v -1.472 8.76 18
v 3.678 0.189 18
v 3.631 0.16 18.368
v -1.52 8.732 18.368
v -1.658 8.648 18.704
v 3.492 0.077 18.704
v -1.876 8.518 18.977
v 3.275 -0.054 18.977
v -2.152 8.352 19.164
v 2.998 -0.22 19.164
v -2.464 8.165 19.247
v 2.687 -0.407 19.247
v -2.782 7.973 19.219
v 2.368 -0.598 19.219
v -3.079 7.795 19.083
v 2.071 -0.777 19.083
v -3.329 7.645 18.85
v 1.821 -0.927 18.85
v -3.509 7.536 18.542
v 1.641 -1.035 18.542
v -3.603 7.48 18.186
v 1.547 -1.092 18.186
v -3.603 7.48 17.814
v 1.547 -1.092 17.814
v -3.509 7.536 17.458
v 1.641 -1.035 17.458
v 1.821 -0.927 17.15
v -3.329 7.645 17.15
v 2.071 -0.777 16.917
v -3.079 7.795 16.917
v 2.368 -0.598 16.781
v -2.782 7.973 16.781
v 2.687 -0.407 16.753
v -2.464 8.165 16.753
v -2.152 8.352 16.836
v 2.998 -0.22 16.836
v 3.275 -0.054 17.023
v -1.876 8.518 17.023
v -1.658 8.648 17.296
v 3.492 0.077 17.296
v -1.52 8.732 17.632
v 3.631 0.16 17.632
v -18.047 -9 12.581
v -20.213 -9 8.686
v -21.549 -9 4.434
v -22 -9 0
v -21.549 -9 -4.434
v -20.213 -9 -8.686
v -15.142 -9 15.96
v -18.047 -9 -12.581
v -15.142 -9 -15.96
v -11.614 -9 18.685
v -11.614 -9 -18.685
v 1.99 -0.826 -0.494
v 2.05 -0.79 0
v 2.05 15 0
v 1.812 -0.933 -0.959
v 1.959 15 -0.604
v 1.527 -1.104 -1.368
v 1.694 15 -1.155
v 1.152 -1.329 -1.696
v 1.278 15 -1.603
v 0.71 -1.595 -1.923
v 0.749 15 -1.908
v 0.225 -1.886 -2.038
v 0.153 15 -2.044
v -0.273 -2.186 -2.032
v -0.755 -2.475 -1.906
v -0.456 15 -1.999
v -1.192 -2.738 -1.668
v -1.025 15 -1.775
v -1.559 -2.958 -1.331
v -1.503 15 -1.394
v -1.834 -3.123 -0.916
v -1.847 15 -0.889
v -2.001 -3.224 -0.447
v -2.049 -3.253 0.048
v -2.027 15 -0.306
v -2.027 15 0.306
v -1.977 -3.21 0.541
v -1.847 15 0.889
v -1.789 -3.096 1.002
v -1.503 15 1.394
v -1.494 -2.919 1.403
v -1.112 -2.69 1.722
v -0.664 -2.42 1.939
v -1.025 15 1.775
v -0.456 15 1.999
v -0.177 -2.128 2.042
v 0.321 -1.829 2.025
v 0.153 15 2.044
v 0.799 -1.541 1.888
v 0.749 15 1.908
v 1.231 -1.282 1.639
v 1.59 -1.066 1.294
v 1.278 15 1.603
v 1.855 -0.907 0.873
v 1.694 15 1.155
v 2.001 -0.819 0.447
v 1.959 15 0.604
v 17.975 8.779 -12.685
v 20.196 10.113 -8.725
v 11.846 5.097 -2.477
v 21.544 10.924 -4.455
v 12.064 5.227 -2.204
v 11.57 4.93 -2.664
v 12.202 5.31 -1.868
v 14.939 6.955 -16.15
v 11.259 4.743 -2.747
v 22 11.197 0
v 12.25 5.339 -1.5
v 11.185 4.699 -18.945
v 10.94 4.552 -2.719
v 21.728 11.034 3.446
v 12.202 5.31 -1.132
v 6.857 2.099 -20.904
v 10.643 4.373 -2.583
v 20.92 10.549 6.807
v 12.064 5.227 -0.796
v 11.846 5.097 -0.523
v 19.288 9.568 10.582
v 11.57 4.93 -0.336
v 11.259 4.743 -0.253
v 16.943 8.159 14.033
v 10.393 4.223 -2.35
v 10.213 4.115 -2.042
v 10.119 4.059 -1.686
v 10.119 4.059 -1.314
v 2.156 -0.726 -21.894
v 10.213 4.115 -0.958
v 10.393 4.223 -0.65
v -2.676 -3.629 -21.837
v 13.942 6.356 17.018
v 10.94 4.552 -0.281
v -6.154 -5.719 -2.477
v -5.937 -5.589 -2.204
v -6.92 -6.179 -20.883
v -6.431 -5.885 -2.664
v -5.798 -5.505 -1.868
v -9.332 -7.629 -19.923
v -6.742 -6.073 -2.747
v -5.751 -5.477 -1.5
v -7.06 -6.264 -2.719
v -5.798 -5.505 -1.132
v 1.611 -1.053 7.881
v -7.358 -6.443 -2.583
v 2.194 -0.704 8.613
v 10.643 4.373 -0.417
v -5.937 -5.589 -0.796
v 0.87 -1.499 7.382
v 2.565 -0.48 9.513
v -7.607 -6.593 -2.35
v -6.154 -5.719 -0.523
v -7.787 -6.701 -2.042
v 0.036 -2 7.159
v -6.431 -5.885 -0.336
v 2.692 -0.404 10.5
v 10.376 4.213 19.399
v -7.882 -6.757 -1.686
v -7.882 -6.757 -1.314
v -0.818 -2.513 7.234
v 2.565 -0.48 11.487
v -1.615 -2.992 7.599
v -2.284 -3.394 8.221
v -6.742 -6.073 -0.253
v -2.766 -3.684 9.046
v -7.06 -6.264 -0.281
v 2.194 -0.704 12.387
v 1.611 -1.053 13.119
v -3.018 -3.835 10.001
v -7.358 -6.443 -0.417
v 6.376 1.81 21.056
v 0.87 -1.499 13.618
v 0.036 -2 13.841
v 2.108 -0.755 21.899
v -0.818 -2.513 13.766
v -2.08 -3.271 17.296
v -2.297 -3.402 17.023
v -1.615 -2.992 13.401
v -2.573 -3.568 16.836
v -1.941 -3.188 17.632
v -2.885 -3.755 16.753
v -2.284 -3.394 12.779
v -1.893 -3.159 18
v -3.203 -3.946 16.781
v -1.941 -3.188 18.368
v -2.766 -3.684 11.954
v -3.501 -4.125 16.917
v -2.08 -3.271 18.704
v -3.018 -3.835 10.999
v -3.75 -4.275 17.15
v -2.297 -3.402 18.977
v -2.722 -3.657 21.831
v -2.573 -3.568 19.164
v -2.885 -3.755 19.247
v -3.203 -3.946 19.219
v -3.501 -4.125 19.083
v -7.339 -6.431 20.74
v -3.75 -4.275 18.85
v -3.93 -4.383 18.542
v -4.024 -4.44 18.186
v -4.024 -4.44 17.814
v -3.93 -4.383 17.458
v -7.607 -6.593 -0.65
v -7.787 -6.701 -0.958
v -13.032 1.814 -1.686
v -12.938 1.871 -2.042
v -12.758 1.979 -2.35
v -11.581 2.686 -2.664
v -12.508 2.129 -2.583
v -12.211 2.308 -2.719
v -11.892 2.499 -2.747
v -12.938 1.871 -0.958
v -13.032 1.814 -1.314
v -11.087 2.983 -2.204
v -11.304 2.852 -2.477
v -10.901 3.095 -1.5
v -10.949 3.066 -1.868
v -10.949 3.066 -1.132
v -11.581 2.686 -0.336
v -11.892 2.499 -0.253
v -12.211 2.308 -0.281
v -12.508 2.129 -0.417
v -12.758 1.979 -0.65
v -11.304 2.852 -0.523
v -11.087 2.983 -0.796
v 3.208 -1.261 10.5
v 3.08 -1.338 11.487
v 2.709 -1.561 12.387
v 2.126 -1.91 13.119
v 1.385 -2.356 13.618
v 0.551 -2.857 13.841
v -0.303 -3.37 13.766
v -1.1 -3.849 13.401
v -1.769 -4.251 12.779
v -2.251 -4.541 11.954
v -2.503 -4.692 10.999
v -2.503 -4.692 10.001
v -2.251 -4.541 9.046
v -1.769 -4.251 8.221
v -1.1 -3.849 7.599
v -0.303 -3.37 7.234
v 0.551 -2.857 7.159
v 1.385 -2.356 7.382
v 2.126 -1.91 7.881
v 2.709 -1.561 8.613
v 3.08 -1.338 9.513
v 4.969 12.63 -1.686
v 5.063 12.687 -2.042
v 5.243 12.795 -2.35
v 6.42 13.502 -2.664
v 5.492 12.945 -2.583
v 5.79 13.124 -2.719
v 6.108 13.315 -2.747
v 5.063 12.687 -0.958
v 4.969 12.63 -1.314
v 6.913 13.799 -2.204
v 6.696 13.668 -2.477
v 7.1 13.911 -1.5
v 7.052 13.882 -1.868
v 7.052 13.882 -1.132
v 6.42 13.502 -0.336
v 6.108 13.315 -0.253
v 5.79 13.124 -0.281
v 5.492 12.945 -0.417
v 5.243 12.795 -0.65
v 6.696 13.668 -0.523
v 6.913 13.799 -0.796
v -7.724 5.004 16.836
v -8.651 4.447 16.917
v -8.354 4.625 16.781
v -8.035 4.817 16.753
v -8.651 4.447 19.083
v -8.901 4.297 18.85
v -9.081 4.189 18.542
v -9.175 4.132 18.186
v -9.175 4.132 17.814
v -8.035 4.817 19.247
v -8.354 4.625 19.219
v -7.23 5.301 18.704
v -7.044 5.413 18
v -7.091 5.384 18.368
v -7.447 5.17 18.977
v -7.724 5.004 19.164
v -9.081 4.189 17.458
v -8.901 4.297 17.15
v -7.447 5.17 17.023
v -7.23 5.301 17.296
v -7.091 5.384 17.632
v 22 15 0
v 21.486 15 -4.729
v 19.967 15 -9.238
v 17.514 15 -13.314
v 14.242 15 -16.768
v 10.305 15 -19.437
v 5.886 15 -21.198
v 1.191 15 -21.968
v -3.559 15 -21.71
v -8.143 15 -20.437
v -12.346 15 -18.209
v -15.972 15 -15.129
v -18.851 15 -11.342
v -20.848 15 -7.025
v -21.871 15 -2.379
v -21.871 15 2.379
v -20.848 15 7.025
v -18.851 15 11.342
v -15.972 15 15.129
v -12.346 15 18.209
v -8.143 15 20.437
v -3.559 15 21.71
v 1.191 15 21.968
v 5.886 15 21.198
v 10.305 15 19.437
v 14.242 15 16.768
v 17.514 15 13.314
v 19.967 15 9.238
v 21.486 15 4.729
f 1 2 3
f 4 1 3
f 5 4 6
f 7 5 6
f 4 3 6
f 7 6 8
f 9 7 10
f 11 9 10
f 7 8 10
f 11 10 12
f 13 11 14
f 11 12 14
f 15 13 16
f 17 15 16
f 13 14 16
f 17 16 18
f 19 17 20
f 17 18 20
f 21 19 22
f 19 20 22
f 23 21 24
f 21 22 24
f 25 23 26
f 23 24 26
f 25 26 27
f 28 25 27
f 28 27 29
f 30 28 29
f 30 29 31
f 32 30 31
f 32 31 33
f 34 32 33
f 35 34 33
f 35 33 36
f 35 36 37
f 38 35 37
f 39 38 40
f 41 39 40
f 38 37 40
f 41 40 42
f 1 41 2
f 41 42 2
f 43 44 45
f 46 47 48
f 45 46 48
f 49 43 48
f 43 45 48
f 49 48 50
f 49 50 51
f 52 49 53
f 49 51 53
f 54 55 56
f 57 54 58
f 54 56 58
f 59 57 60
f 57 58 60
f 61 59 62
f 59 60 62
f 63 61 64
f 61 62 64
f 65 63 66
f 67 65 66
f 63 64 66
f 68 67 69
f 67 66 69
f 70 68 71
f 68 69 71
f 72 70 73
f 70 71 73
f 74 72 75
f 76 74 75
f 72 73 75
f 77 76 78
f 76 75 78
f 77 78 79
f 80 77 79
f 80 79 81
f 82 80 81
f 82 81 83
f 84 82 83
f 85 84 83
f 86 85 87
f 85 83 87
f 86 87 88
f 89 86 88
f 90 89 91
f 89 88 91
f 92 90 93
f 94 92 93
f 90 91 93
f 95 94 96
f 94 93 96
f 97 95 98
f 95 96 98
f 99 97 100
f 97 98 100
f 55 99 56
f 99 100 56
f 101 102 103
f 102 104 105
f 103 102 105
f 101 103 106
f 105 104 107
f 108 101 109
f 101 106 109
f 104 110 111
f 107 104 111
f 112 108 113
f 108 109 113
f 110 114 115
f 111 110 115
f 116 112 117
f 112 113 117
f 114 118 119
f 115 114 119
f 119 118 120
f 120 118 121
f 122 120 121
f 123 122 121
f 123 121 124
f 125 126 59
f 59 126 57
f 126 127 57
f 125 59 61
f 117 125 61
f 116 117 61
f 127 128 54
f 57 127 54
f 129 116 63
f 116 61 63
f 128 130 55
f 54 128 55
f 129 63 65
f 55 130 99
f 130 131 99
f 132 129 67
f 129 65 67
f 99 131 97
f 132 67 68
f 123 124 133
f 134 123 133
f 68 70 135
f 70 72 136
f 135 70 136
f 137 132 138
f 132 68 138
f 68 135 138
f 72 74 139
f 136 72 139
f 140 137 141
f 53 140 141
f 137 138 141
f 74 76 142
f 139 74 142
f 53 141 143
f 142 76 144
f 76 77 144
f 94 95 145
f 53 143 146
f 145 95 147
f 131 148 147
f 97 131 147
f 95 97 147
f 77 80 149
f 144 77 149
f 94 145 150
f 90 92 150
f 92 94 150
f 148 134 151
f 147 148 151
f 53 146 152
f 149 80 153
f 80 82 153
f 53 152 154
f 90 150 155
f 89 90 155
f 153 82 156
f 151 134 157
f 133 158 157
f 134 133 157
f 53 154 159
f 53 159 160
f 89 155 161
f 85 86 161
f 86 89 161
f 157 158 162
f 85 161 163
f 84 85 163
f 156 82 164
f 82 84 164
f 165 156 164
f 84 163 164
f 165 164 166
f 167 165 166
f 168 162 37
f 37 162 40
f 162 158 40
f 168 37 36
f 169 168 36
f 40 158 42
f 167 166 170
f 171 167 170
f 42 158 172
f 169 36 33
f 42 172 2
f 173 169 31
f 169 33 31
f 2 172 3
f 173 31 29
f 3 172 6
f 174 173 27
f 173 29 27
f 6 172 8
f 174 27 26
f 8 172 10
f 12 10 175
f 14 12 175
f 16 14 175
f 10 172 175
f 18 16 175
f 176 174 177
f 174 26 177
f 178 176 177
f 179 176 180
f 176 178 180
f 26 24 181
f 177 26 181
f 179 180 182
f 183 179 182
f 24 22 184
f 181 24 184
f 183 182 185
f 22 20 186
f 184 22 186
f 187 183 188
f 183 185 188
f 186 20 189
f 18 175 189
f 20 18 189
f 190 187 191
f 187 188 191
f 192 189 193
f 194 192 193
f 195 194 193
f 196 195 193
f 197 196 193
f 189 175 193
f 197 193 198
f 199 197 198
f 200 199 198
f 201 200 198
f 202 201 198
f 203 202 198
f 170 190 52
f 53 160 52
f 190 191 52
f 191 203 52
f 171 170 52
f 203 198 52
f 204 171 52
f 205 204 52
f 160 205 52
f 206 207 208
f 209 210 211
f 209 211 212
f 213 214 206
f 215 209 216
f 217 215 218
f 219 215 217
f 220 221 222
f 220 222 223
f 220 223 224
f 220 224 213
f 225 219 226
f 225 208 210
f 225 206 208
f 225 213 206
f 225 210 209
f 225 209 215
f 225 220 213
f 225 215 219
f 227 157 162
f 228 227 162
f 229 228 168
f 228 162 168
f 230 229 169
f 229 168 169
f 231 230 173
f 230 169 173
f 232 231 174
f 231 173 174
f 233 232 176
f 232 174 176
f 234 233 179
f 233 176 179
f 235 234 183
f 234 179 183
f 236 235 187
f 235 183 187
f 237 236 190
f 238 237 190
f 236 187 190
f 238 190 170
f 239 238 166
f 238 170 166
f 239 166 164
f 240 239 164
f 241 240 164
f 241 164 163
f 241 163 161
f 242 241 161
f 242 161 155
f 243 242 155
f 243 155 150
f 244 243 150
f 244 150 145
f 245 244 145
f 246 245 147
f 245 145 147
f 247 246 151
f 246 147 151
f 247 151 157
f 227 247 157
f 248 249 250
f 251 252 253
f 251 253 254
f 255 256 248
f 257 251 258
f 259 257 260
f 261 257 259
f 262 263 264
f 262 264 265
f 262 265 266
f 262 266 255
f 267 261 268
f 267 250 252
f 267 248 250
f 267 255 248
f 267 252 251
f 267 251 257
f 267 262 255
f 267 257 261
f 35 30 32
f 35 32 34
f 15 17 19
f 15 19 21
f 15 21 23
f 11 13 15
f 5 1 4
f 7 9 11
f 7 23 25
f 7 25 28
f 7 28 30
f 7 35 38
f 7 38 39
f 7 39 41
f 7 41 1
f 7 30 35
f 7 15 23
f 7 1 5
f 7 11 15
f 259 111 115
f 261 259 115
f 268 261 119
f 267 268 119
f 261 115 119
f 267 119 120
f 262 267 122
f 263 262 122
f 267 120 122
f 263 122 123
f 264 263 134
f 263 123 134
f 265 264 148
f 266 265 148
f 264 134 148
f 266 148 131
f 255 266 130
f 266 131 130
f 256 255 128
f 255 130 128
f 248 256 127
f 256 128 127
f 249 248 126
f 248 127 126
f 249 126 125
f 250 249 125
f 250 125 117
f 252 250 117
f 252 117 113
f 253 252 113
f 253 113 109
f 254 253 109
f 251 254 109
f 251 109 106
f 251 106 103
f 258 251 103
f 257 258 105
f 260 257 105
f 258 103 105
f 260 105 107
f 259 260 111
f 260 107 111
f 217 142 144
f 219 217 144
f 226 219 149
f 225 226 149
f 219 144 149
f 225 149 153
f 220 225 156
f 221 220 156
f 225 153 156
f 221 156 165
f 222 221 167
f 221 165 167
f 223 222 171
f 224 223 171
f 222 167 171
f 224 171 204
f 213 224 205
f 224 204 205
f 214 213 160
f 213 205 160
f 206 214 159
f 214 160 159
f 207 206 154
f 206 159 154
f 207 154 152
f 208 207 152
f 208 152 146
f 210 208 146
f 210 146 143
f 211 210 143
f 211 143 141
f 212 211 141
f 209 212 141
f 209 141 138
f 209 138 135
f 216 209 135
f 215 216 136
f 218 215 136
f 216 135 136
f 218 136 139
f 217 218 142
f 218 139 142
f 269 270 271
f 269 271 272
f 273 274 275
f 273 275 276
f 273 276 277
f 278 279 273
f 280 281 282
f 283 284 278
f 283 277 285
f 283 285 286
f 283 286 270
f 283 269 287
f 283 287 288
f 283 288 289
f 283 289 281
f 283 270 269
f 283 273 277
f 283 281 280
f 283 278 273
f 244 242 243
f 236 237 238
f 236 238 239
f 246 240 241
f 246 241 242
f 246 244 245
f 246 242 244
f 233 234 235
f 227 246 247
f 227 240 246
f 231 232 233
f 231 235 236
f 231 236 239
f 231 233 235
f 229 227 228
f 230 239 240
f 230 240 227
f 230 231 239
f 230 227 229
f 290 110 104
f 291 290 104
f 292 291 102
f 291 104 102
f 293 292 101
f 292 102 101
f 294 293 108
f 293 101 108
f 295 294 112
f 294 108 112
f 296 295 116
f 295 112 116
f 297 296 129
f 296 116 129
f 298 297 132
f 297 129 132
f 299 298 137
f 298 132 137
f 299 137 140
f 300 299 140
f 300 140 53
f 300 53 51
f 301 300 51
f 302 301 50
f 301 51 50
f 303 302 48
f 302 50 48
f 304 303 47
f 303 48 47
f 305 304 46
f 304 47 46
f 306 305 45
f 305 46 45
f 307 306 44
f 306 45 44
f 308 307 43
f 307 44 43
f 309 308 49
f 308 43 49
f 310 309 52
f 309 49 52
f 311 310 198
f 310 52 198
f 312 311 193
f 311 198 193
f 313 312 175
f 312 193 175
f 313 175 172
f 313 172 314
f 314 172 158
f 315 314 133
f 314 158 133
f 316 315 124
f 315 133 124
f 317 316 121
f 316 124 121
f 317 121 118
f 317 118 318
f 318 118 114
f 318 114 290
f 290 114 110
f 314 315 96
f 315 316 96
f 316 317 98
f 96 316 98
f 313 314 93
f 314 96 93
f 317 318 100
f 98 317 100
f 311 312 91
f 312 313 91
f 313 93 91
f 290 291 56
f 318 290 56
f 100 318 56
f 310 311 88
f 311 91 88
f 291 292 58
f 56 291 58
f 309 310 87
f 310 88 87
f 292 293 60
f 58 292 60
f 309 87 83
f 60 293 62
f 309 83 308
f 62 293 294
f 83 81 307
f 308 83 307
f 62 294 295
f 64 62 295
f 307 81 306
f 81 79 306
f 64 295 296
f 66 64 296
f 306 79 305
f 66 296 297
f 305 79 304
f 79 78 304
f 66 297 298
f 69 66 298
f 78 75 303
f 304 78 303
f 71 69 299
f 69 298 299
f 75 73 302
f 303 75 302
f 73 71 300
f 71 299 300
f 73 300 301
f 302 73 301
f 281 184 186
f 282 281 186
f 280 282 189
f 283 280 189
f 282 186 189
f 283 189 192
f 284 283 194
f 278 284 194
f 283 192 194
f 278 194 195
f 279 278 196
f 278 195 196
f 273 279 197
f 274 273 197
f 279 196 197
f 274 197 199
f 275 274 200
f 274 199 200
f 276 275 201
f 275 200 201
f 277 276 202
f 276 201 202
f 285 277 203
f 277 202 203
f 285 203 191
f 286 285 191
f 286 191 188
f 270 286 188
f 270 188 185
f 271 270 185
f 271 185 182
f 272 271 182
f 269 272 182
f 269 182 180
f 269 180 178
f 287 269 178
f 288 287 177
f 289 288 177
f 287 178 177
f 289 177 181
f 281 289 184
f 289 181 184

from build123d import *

# Parameters (mm, degrees)
PAD_DEPTH    = 25
SKETCH003_R  = 1.25
POCKET_DEPTH = 10
SKETCH004_R  = 3.35
PAD001_DEPTH = 1


with BuildPart() as pad:
    # Sketch002 → Pad (new body, symmetric)
    with BuildSketch(Plane.XY):
        Polygon((25, 13), (-11.6141486117, -9), (25, -9), align=None)
    extrude(amount=PAD_DEPTH, both=True)


with BuildPart() as pad001:
    # Sketch001 → Revolution001 (revolve)
    with BuildSketch(Plane.XY):
        Polygon((0, -9), (0, -5), (2.05, -5), (2.05, 15), (22, 15), (22, -9), align=None)
    revolve(axis=Axis((0, 0, 0), (0, 1, 0)))

    # Cut: cut Pad
    add(pad.part, mode=Mode.SUBTRACT)

    # Sketch003 → Pocket (cut)
    with BuildSketch(Plane(origin=(0.8924461116, -1.4852797526, 0), x_dir=(0.8571673007, 0.5150380749, 0), z_dir=(0.5150380749, -0.8571673007, 0))):
        with Locations((-4.5, 18)):
            Circle(SKETCH003_R)
        with Locations((2, 18)):
            Circle(SKETCH003_R)
        with Locations((12, -1.5)):
            Circle(SKETCH003_R)
        with Locations((-9, -1.5)):
            Circle(SKETCH003_R)
    extrude(amount=-POCKET_DEPTH, mode=Mode.SUBTRACT)

    # Sketch004 → Pad001 (new body)
    with BuildSketch(Plane(origin=(0.8924461116, -1.4852797526, 0), x_dir=(0.8571673007, 0.5150380749, 0), z_dir=(0.5150380749, -0.8571673007, 0))):
        with Locations((-1.25, 10.5)):
            Circle(SKETCH004_R)
    extrude(amount=PAD001_DEPTH)


solid = pad001.part
